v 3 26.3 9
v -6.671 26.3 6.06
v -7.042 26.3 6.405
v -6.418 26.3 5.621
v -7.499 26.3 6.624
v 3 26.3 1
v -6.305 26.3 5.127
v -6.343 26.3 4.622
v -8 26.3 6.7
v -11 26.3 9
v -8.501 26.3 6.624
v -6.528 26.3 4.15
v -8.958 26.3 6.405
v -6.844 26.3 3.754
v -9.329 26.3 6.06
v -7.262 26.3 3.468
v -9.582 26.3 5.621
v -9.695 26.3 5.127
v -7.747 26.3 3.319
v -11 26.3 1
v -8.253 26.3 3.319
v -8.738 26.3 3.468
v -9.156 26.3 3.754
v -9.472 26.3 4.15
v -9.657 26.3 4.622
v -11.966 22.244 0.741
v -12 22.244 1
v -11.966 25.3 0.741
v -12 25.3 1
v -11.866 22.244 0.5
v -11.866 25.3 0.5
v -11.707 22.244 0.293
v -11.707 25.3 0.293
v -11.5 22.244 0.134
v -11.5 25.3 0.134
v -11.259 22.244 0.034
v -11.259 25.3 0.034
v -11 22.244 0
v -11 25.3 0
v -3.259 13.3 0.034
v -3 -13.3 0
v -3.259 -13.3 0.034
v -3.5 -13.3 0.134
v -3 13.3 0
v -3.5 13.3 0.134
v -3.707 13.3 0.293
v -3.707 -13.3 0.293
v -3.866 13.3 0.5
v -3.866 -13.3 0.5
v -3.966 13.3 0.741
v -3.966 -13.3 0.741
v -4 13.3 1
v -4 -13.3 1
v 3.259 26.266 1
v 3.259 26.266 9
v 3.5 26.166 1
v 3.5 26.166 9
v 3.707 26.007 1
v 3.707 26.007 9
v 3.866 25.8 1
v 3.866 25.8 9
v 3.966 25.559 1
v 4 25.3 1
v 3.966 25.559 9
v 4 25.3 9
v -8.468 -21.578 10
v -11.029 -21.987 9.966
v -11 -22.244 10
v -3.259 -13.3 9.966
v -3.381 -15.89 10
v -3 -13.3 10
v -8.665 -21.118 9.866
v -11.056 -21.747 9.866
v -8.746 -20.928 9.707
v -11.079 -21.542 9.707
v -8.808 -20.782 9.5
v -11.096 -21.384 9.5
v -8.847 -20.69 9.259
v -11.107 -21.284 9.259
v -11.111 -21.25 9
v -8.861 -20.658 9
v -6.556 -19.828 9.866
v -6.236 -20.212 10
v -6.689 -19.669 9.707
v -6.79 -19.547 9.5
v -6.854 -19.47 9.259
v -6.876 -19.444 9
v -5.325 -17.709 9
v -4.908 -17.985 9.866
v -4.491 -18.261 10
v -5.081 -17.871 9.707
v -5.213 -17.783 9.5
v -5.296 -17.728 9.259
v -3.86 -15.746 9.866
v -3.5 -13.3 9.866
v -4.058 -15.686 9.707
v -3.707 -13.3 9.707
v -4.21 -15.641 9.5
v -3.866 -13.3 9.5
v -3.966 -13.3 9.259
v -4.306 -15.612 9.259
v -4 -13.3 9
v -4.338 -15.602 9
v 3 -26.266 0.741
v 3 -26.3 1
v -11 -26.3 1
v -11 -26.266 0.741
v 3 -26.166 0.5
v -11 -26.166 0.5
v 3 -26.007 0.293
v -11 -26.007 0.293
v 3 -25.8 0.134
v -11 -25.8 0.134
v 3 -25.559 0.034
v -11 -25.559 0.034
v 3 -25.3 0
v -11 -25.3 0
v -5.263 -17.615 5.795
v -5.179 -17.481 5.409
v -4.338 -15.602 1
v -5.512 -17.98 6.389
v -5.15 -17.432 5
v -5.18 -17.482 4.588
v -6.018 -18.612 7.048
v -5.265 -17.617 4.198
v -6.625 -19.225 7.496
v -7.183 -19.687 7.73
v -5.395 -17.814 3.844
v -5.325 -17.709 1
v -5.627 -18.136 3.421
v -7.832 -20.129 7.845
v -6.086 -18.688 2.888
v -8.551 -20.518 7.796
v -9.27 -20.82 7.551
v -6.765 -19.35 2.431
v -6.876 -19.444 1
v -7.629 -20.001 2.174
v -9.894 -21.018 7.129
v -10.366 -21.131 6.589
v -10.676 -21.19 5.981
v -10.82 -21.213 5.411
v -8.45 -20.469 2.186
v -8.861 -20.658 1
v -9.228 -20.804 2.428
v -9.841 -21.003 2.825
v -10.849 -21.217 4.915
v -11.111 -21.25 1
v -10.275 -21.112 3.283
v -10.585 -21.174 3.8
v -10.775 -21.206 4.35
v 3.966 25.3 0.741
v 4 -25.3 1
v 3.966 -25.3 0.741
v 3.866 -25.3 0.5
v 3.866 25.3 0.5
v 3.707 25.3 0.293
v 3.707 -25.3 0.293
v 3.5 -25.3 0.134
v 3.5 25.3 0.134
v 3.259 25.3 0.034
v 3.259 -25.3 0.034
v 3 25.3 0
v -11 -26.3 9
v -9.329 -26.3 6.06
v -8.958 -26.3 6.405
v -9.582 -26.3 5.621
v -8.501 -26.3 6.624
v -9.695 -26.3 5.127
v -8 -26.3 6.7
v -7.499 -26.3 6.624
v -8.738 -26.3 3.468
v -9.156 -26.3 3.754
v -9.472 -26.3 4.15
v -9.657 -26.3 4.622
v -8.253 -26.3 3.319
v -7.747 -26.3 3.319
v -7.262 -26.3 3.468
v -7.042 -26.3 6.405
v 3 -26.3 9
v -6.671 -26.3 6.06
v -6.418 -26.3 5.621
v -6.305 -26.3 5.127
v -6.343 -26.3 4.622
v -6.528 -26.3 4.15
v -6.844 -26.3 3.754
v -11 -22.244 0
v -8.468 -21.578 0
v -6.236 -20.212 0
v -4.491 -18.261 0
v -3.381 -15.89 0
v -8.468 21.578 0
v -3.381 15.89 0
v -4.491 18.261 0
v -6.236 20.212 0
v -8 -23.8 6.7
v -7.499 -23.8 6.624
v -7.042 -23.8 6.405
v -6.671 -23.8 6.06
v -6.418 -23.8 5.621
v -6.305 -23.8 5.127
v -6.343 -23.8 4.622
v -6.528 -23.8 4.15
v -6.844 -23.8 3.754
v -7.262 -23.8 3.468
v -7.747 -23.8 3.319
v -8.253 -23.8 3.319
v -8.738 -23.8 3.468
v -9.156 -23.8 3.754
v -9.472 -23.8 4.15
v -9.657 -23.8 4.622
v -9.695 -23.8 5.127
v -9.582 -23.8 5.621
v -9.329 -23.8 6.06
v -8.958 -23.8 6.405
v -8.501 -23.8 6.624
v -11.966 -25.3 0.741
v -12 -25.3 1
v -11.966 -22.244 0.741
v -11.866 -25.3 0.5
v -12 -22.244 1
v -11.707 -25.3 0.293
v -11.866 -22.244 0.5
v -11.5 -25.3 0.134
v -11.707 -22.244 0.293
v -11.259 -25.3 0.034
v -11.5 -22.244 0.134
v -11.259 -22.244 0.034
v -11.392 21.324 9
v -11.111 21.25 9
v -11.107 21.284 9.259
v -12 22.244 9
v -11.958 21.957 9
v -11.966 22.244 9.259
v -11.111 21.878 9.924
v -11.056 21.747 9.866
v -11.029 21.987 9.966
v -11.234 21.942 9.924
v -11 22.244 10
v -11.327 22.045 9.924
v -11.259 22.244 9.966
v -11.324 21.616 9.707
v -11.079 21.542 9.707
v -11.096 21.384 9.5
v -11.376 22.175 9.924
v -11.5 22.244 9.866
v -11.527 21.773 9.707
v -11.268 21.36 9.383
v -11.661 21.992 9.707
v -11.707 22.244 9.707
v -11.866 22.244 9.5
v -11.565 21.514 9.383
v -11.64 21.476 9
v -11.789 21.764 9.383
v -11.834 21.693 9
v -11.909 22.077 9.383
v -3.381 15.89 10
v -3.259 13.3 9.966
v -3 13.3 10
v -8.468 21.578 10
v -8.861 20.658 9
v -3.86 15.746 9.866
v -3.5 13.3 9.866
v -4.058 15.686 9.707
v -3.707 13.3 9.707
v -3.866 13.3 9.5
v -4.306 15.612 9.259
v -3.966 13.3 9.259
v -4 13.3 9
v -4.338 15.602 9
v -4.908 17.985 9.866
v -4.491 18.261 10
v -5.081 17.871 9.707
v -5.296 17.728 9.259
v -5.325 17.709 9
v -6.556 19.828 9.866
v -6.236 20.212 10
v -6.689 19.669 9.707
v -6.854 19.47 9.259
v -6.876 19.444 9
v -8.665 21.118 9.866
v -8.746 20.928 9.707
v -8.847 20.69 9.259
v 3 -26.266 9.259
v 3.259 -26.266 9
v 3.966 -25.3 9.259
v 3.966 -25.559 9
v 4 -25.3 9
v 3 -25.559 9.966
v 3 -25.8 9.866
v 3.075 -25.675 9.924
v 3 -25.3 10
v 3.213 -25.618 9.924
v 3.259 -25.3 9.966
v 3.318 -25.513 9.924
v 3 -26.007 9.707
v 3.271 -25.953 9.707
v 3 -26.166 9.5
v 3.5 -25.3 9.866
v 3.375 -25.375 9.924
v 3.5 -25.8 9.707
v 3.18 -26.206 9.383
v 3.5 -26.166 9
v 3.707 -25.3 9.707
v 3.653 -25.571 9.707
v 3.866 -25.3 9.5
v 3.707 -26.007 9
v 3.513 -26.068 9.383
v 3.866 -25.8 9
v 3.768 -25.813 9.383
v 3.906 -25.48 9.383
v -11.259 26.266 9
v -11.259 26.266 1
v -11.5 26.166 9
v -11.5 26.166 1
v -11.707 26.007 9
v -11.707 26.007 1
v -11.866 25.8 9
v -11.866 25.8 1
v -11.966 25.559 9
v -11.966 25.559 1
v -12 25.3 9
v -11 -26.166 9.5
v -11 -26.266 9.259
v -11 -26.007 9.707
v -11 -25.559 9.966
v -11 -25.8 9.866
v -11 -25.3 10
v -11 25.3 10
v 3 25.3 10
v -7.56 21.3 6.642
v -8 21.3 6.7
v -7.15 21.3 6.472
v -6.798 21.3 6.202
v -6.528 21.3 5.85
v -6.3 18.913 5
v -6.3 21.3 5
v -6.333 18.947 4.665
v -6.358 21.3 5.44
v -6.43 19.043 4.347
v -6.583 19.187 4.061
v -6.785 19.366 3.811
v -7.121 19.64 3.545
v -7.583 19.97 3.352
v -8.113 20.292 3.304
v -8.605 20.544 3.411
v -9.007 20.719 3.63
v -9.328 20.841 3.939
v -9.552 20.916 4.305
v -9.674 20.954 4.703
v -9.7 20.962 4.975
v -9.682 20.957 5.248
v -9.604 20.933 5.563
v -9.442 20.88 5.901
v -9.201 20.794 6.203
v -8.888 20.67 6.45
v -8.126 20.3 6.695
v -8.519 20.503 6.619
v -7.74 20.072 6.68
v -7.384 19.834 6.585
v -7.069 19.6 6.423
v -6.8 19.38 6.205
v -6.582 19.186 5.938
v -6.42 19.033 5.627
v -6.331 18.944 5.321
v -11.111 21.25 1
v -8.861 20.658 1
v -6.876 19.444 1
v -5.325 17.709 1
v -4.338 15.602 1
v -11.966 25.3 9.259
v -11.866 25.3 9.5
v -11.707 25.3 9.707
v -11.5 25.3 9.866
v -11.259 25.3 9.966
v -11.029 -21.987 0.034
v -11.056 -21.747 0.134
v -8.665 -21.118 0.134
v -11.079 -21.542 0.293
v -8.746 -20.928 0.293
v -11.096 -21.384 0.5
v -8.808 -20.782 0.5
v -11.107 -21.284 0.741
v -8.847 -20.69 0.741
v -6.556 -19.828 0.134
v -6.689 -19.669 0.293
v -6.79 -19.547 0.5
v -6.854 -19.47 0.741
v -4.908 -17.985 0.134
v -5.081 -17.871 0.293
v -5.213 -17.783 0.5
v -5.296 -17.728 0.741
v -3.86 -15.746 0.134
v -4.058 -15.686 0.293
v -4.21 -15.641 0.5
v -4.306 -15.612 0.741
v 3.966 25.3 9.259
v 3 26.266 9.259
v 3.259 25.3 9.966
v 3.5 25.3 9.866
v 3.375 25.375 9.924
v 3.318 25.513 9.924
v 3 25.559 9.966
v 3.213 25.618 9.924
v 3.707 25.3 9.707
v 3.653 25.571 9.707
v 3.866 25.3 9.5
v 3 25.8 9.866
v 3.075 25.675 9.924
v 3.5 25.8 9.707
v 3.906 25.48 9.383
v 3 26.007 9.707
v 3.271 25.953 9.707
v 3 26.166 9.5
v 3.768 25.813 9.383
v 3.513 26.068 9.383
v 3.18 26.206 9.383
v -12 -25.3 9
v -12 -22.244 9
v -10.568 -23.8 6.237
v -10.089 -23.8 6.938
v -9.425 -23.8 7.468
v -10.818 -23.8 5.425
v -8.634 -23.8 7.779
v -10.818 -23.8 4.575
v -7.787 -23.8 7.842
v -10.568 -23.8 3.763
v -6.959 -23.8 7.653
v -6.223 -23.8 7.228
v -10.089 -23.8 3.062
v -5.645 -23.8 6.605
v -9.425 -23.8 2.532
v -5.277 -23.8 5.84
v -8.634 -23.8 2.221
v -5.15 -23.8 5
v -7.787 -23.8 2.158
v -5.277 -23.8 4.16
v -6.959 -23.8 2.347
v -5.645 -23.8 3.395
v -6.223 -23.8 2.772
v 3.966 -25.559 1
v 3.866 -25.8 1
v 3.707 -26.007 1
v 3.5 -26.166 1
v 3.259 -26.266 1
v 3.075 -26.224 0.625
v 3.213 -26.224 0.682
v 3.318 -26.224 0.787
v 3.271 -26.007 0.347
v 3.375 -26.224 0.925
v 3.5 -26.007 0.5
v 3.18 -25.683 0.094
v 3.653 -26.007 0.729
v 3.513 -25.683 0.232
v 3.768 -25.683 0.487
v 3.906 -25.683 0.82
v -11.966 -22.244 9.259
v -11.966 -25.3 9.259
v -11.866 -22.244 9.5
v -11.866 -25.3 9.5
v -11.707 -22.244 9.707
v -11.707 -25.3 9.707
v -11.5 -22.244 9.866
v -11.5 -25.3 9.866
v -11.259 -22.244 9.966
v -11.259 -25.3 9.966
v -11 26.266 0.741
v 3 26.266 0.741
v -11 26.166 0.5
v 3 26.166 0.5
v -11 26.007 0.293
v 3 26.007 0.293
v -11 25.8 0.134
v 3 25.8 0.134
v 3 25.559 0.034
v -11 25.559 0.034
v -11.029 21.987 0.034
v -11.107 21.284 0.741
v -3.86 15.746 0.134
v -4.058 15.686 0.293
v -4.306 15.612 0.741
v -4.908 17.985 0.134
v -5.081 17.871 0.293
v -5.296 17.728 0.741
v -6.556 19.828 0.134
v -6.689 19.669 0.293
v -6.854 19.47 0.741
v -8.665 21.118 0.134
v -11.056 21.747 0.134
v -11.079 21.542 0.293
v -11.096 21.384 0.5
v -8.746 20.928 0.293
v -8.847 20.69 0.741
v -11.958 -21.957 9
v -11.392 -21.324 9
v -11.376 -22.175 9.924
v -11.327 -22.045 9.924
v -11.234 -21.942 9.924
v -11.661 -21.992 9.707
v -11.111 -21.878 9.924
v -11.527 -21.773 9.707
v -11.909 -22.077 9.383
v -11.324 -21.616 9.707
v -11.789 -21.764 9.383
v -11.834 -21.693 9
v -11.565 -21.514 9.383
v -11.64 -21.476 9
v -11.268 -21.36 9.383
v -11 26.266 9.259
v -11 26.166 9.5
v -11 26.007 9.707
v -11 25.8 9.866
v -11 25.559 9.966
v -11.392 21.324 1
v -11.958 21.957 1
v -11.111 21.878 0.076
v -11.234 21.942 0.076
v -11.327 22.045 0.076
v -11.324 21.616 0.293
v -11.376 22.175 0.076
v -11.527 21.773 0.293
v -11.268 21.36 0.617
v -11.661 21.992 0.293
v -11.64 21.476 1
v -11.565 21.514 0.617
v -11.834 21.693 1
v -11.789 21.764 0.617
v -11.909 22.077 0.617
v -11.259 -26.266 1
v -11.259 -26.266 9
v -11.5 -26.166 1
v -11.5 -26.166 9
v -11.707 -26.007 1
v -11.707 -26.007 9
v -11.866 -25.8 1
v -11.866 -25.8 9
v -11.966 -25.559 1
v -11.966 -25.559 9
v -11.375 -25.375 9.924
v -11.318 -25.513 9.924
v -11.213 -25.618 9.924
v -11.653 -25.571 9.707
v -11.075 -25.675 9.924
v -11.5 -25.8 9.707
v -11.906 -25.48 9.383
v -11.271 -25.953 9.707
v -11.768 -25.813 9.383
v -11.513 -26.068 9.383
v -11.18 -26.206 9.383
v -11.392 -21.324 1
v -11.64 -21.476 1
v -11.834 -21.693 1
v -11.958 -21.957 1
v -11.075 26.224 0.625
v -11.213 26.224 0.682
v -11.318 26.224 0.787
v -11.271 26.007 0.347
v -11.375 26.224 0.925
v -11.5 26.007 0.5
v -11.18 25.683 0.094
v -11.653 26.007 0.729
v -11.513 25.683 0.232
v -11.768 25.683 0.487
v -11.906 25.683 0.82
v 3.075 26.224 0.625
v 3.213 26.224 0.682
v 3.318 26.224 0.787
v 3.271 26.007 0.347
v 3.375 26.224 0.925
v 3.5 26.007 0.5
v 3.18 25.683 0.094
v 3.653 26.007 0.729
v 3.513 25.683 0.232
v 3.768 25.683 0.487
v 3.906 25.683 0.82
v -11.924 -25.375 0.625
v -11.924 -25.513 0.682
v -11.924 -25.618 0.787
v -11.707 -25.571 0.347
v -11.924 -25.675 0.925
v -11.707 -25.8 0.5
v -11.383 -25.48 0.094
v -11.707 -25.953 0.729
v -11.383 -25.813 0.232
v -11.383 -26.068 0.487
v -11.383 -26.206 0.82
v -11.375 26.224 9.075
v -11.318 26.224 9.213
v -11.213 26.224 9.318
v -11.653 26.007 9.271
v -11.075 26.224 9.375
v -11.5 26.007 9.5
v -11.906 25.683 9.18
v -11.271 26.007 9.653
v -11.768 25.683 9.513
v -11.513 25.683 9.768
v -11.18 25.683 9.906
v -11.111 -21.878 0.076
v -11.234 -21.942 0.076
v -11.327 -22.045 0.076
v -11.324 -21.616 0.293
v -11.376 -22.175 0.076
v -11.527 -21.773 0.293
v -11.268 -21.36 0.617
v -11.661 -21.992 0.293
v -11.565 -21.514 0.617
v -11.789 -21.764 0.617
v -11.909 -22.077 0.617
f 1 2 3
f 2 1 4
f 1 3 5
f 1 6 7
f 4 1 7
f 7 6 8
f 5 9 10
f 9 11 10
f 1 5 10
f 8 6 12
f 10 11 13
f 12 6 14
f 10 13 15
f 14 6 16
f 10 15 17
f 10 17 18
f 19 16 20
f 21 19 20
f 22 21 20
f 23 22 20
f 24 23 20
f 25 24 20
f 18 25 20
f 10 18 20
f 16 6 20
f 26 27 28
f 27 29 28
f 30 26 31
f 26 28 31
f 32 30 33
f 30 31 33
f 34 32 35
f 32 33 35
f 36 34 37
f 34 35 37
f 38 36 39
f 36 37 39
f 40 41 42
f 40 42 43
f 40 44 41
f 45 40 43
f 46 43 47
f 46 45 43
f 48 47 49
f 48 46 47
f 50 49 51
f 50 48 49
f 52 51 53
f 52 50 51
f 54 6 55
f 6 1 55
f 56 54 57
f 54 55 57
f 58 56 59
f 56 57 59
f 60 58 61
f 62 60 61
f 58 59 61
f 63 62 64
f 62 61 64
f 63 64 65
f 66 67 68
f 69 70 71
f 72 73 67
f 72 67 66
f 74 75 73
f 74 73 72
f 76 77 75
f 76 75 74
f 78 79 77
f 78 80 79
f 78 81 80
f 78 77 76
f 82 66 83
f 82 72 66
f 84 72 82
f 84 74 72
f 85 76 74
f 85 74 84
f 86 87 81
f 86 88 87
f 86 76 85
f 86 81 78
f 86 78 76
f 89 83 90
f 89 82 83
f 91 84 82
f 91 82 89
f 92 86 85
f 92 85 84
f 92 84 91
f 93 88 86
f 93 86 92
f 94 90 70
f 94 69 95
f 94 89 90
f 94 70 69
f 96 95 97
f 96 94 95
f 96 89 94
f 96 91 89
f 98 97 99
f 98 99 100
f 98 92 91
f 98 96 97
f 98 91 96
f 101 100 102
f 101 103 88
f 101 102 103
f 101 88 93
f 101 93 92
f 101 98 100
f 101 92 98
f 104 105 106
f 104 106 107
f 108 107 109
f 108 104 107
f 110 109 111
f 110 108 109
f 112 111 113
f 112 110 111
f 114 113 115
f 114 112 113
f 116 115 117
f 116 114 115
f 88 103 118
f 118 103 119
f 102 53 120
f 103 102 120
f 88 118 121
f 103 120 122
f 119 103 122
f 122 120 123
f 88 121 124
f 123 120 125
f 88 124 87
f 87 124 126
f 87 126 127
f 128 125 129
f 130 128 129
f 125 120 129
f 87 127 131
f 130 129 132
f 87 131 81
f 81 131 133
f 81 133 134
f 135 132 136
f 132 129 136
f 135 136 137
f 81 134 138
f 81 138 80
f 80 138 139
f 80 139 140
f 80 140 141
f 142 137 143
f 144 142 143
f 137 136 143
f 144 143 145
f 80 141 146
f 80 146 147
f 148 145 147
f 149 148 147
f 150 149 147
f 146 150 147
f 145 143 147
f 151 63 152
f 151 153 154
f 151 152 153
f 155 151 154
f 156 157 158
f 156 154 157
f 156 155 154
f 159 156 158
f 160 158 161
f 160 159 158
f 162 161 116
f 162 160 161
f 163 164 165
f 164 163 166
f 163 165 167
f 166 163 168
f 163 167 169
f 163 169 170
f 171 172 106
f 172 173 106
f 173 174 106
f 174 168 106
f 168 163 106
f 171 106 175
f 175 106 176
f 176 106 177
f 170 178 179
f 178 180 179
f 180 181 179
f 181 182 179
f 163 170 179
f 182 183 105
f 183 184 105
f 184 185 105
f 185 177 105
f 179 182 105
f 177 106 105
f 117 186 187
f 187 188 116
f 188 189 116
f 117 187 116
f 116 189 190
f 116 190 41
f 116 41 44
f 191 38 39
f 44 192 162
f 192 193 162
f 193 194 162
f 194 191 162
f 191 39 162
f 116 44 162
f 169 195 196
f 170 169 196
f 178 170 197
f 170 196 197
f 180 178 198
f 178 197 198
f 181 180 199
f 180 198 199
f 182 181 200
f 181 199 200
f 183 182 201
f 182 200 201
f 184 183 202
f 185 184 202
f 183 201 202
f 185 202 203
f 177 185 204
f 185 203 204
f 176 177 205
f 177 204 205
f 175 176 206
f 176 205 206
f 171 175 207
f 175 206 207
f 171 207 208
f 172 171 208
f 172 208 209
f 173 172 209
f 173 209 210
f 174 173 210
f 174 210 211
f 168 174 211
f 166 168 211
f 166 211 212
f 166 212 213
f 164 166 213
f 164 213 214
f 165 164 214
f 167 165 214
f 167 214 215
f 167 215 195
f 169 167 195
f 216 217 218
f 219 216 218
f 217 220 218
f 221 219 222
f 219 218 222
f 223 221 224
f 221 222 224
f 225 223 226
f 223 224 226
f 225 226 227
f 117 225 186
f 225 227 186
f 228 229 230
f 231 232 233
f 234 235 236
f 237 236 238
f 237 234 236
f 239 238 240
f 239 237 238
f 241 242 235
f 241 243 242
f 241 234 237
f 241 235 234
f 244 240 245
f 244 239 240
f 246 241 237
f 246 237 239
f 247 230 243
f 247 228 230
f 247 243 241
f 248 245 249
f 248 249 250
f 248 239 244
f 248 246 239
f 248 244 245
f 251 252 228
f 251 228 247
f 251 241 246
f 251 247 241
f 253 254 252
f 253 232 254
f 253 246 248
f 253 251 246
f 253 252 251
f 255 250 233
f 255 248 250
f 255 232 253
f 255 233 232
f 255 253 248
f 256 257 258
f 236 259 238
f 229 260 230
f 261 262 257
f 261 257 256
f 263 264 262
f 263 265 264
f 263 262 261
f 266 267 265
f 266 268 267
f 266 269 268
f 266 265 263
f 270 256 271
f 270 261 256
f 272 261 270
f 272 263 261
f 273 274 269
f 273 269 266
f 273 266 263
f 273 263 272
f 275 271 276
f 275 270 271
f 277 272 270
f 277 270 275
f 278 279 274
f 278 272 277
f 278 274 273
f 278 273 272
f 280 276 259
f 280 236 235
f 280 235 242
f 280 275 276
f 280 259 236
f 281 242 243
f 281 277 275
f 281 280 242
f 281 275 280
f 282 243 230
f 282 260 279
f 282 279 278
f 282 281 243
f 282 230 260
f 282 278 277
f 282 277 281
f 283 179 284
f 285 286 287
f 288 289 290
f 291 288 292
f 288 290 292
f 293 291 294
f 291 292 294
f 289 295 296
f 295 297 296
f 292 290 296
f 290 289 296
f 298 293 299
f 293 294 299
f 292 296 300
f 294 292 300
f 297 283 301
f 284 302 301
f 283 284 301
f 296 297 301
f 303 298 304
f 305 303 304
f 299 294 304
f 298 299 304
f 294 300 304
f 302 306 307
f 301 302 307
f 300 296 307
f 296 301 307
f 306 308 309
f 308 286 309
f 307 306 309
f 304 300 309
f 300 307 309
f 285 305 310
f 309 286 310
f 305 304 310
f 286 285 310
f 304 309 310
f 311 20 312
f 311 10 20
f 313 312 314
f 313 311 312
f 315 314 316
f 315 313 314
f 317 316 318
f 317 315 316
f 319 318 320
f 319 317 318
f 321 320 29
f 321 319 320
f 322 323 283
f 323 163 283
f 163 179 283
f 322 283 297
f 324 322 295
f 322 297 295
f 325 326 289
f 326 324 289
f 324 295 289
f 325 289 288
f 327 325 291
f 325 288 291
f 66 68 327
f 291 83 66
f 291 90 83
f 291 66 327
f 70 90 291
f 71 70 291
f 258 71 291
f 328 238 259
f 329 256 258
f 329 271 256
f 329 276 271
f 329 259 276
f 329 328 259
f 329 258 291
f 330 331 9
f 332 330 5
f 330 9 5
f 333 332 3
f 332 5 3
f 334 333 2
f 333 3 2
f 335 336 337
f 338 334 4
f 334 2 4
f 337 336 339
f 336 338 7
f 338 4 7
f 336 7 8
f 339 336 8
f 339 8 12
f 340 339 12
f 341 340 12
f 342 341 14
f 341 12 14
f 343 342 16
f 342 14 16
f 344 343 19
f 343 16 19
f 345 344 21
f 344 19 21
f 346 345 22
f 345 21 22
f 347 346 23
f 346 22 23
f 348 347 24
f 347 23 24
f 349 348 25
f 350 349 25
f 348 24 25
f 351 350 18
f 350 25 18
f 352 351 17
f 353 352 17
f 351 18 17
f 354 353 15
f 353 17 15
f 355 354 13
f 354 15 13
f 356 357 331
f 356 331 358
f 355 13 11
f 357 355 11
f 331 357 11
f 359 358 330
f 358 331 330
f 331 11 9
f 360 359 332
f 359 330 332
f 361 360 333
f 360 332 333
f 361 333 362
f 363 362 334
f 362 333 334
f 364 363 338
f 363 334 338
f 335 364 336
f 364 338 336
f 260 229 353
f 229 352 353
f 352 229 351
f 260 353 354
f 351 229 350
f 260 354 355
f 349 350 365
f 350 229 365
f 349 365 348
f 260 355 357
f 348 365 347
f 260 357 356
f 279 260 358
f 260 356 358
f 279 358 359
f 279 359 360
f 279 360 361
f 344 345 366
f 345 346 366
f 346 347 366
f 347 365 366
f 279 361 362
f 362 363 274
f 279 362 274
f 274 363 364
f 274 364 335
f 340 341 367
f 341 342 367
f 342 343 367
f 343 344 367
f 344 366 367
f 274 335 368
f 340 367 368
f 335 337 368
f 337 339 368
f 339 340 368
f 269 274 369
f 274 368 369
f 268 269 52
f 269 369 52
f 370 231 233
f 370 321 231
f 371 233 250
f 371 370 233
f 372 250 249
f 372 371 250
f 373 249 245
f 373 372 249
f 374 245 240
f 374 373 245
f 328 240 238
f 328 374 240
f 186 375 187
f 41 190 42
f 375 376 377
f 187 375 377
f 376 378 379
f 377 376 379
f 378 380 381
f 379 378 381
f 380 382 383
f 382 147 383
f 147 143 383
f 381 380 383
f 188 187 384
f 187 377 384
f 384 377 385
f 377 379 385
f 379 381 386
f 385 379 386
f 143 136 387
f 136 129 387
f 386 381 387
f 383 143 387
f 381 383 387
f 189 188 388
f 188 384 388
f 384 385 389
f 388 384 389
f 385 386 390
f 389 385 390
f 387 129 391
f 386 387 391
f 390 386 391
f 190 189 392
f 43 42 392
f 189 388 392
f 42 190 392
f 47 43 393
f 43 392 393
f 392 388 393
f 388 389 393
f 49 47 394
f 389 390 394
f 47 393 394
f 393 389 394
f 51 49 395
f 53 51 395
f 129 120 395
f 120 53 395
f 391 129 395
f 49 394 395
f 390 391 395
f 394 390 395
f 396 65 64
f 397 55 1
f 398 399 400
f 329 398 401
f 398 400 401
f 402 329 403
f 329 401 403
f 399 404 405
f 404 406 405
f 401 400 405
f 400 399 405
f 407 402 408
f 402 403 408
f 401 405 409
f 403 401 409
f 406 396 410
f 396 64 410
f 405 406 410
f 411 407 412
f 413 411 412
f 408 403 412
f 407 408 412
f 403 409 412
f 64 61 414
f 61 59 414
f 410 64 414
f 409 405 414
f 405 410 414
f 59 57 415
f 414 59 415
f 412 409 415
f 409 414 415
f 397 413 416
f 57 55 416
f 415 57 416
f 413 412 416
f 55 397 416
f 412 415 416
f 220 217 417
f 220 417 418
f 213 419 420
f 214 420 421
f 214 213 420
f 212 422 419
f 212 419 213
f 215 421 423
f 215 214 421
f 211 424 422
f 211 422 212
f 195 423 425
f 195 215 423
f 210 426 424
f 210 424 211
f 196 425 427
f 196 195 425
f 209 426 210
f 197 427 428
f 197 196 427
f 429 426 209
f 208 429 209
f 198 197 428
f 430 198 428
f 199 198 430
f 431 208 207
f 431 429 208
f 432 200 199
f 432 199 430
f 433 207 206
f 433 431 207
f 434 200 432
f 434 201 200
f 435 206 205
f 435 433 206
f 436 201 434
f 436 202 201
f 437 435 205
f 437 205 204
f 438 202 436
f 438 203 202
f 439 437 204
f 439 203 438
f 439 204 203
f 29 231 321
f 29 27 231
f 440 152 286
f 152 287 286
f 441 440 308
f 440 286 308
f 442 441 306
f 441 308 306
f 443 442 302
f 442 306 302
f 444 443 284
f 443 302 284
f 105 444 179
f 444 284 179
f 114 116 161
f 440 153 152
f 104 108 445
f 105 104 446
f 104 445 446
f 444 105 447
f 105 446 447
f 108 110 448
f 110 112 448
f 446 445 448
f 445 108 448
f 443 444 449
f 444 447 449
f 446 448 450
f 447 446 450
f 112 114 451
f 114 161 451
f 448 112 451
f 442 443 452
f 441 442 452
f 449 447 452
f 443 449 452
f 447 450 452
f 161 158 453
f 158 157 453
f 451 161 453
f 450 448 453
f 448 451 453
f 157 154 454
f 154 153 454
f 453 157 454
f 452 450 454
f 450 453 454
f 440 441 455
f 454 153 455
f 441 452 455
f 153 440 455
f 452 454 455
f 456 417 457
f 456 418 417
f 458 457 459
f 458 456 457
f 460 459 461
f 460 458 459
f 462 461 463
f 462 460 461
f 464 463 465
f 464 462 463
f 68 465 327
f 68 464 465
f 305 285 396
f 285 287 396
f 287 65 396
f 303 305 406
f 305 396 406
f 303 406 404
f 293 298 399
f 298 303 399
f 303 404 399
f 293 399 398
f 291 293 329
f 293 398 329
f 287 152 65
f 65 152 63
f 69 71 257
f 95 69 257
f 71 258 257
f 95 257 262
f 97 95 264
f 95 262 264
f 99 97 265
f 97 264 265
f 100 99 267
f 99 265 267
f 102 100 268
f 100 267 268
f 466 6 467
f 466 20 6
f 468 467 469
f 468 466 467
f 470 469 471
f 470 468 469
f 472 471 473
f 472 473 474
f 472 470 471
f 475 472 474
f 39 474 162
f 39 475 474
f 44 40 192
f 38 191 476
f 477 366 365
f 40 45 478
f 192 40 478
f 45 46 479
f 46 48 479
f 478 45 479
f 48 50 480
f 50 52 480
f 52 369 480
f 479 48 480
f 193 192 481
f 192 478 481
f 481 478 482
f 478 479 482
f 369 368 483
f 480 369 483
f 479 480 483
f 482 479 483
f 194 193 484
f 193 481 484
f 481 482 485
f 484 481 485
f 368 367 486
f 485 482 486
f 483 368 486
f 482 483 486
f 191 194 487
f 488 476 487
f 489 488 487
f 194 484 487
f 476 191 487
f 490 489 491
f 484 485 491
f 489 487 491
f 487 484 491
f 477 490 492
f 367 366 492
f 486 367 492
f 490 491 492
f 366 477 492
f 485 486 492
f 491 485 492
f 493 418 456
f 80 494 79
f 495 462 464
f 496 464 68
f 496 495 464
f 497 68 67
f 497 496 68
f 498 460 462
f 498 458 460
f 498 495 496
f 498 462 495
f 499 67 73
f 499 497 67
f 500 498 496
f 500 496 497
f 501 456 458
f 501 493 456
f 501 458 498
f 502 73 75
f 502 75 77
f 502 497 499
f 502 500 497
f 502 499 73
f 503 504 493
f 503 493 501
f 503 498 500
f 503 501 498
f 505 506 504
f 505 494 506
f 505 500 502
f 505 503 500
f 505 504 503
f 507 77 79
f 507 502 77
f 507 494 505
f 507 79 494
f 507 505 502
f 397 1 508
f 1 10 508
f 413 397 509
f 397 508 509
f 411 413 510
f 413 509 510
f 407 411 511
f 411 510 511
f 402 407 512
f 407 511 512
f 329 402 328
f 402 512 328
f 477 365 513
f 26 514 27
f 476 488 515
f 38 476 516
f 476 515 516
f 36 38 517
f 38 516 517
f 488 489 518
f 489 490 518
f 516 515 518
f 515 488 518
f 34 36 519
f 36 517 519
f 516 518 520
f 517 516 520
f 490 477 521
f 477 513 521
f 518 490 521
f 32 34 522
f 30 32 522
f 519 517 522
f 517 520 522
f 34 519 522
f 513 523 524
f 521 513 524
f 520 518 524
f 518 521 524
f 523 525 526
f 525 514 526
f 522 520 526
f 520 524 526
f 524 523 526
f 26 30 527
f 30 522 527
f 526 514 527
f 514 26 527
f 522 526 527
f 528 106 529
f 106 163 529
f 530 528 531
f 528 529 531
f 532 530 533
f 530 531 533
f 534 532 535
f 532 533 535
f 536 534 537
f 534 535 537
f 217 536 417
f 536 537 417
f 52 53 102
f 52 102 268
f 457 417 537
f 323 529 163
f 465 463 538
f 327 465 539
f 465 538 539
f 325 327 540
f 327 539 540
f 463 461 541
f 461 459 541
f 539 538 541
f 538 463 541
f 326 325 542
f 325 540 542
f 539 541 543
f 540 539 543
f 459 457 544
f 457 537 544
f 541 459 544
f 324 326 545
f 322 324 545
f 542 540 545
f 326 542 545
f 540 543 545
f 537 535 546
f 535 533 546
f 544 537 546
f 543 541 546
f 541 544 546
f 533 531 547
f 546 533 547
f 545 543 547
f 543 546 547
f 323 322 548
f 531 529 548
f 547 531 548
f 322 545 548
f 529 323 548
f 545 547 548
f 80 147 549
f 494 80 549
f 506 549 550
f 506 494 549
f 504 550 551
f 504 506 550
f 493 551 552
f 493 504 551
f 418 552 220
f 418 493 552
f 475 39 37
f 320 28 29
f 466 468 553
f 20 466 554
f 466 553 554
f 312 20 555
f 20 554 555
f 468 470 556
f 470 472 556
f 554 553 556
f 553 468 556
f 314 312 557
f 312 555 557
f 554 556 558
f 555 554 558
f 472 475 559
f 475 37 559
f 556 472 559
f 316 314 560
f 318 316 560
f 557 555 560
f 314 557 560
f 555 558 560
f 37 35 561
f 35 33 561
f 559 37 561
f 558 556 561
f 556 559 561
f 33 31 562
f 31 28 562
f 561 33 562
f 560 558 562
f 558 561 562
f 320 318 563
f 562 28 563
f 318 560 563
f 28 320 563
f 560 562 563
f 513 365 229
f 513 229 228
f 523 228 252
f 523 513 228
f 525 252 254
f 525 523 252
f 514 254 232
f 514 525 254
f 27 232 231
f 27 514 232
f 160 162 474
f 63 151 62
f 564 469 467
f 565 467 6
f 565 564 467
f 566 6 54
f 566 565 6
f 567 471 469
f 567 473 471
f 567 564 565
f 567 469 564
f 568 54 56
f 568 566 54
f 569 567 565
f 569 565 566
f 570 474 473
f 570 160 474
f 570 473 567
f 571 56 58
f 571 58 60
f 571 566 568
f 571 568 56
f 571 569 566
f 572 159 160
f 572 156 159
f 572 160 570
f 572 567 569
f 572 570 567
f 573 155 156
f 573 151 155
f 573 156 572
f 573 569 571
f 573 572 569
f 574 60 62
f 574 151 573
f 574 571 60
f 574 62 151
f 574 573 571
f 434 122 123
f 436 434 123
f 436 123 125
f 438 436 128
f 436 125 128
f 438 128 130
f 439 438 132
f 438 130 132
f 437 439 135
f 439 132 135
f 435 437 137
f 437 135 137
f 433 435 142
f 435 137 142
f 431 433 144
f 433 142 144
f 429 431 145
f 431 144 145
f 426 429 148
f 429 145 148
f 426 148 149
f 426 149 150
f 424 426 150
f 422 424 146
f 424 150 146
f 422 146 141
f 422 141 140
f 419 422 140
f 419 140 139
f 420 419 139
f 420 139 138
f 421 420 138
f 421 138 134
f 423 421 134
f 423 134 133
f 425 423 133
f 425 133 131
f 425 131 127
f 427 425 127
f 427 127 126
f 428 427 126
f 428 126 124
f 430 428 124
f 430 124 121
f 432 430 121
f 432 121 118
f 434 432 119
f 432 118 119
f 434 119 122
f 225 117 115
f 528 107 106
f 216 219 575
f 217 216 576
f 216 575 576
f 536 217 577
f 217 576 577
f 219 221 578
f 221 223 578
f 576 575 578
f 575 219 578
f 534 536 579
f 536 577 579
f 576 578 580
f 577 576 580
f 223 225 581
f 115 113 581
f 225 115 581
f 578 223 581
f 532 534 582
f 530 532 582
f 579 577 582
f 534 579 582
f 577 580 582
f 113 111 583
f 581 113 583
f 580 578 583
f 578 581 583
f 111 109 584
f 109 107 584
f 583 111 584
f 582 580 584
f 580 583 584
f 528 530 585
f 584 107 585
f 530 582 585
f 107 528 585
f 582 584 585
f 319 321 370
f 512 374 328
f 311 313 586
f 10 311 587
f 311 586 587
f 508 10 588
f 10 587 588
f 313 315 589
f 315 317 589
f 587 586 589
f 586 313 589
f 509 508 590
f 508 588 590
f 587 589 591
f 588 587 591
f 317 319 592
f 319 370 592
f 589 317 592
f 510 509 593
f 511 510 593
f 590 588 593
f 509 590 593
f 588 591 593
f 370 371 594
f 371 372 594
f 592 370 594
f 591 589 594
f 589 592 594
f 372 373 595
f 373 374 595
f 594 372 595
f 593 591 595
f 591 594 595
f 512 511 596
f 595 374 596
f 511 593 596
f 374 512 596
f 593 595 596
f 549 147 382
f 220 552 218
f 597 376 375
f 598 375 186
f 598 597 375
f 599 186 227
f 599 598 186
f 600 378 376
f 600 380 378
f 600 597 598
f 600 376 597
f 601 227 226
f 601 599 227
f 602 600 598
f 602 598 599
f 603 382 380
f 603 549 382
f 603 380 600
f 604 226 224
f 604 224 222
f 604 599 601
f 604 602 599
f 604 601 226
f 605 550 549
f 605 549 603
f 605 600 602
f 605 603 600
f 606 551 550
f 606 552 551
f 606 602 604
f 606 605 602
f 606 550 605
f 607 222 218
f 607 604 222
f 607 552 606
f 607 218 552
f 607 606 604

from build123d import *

# Parameters (mm, degrees)
SKETCH1_W               = 8
SKETCH1_H               = 5
SKETCH1_H_2             = 52.6
BOSS_EXTRUDE1_DEPTH     = 10
SKETCH2_R               = 1.7
CUT_EXTRUDE1_DEPTH      = 55.870392745
CUT_EXTRUDE2_DEPTH      = 40
CUT_EXTRUDE2_DEPTH_BACK = 2.5
SKETCH3_R               = 2.85
FILLET1_DEPTH           = 2.1499999
FILLET1_START           = 7.8500001
FILLET1_2_DEPTH         = 2.1499999
FILLET1_START_2         = 0.9438
FILLET1_3_DEPTH         = 2.356451924
FILLET1_START_3         = 6.7000001
FILLET1_4_DEPTH         = 2.2437999
FILLET1_START_4         = 2.1499999
FILLET1_5_DEPTH         = 5.7000002
FILLET1_6_OUTLINE_W     = 1.7
FILLET1_6_OUTLINE_H     = 2.386959423
FILLET1_6_OUTLINE_W_2   = 2.85
FILLET1_6_OUTLINE_H_2   = 3.868292879
FILLET2_R               = 1


with BuildPart() as part:
    # Sketch1 → Boss-Extrude1 (new body)
    with BuildSketch(Plane.XY):
        with Locations((-8, 23.8)):
            Rectangle(SKETCH1_W, SKETCH1_H)
        Rectangle(SKETCH1_W, SKETCH1_H_2)
        with Locations((-8, -23.8)):
            Rectangle(SKETCH1_W, SKETCH1_H)
    extrude(amount=BOSS_EXTRUDE1_DEPTH)

    # Sketch2 → Cut-Extrude1 (cut, through all)
    with BuildSketch(Plane(origin=(0, 26.3, 0), x_dir=(1, 0, 0), z_dir=(0, 1, 0))):
        with Locations(Location((-8, -5, 0), (0, 0, 270))):
            Circle(SKETCH2_R)
    extrude(amount=-CUT_EXTRUDE1_DEPTH, mode=Mode.SUBTRACT)

    # Sketch3 → Cut-Extrude2 (cut, two sides: drawn at the far end of the back side and taken through both)
    with BuildSketch(Plane(origin=(0, -21.3, 0), x_dir=(1, 0, 0), z_dir=(0, 1, 0)).offset(-CUT_EXTRUDE2_DEPTH_BACK)):
        with Locations((-8, -5)):
            Circle(SKETCH3_R)
    extrude(amount=CUT_EXTRUDE2_DEPTH + CUT_EXTRUDE2_DEPTH_BACK, mode=Mode.SUBTRACT)

    # Fillet1: read off the stored shape, not the designer's step
    # Fillet1 outline → Fillet1 (add)
    with BuildSketch(Plane.XY):
        with BuildLine():
            ThreePointArc((-12, 21.3), (-6.343145751, 18.956854249), (-4, 13.3))
            Line((-4, 13.3), (-4, 21.3))
            Line((-4, 21.3), (-12, 21.3))
        make_face()
        with BuildLine():
            Line((-4, -21.3), (-4, -13.3))
            ThreePointArc((-4, -13.3), (-6.343145751, -18.956854249), (-12, -21.3))
            Line((-12, -21.3), (-4, -21.3))
        make_face()
    extrude(amount=FILLET1_DEPTH)

    # Fillet1 2 outline → Fillet1 2 (add)
    with BuildSketch(Plane.XY.offset(FILLET1_START)):
        with BuildLine():
            ThreePointArc((-12, 21.3), (-6.343145751, 18.956854249), (-4, 13.3))
            Line((-4, 13.3), (-4, 21.3))
            Line((-4, 21.3), (-12, 21.3))
        make_face()
        with BuildLine():
            Line((-4, -21.3), (-4, -13.3))
            ThreePointArc((-4, -13.3), (-6.343145751, -18.956854249), (-12, -21.3))
            Line((-12, -21.3), (-4, -21.3))
        make_face()
    extrude(amount=FILLET1_2_DEPTH)

    # Fillet1 3 outline → Fillet1 3 (add)
    with BuildSketch(Plane.XY.offset(FILLET1_START_2)):
        with BuildLine():
            ThreePointArc((-12, 21.3), (-6.343145751, 18.956854249), (-4, 13.3))
            Line((-4, 13.3), (-4, 21.3))
            Line((-4, 21.3), (-12, 21.3))
        make_face()
    extrude(amount=FILLET1_3_DEPTH)

    # Fillet1 4 outline → Fillet1 4 (add)
    with BuildSketch(Plane.XY.offset(FILLET1_START_3)):
        with BuildLine():
            ThreePointArc((-12, 21.3), (-6.343145751, 18.956854249), (-4, 13.3))
            Line((-4, 13.3), (-4, 21.3))
            Line((-4, 21.3), (-12, 21.3))
        make_face()
    extrude(amount=FILLET1_4_DEPTH)

    # Fillet1 5 outline → Fillet1 5 (add)
    with BuildSketch(Plane.XY.offset(FILLET1_START_4)):
        with BuildLine():
            ThreePointArc((-12, 21.3), (-6.343145751, 18.956854249), (-4, 13.3))
            Line((-4, 13.3), (-4, 21.3))
            Line((-4, 21.3), (-12, 21.3))
        make_face()
        with BuildLine():
            Line((-4, -21.3), (-4, -13.3))
            ThreePointArc((-4, -13.3), (-6.343145751, -18.956854249), (-12, -21.3))
            Line((-12, -21.3), (-4, -21.3))
        make_face()
    extrude(amount=FILLET1_5_DEPTH)

    # Fillet1 6 outline → Fillet1 6 (revolve, cut)
    with BuildSketch(Plane(origin=(-8, 0, 5), x_dir=(1, 0, 0), z_dir=(0, 0, 1))):
        with Locations((0.85, 20.106520289)):
            Rectangle(FILLET1_6_OUTLINE_W, FILLET1_6_OUTLINE_H)
        with Locations((1.425, -19.36585356)):
            Rectangle(FILLET1_6_OUTLINE_W_2, FILLET1_6_OUTLINE_H_2)
    revolve(axis=Axis((-8, 0, 5), (0, 1, 0)), mode=Mode.SUBTRACT)

    # Fillet2
    fillet2_edges = [part.edges().sort_by_distance(p)[0] for p in [
        (4, 0, 0),
        (-4, -26.3, 0),
        (-12, -23.8, 0),
        (-12, 23.8, 10),
        (-12, 23.8, 0),
        (-4, 26.3, 0),
        (4, 26.3, 5),
        (4, -26.3, 5),
        (-12, -26.3, 5),
        (-12, -21.3, 5),
        (-12, 21.3, 5),
        (-12, 26.3, 5),
        (-12, -23.8, 10),
        (-4, -26.3, 10),
        (4, 0, 10),
        (-4, 0, 0),
        (-4, 0, 10),
        (-6.343145751, 18.956854249, 0),
        (-4, 26.3, 10),
        (-6.343145751, 18.956854249, 10),
        (-6.343145751, -18.956854249, 0),
        (-6.343145751, -18.956854249, 10),
    ]]
    fillet(fillet2_edges, radius=FILLET2_R)


solid = part.part
